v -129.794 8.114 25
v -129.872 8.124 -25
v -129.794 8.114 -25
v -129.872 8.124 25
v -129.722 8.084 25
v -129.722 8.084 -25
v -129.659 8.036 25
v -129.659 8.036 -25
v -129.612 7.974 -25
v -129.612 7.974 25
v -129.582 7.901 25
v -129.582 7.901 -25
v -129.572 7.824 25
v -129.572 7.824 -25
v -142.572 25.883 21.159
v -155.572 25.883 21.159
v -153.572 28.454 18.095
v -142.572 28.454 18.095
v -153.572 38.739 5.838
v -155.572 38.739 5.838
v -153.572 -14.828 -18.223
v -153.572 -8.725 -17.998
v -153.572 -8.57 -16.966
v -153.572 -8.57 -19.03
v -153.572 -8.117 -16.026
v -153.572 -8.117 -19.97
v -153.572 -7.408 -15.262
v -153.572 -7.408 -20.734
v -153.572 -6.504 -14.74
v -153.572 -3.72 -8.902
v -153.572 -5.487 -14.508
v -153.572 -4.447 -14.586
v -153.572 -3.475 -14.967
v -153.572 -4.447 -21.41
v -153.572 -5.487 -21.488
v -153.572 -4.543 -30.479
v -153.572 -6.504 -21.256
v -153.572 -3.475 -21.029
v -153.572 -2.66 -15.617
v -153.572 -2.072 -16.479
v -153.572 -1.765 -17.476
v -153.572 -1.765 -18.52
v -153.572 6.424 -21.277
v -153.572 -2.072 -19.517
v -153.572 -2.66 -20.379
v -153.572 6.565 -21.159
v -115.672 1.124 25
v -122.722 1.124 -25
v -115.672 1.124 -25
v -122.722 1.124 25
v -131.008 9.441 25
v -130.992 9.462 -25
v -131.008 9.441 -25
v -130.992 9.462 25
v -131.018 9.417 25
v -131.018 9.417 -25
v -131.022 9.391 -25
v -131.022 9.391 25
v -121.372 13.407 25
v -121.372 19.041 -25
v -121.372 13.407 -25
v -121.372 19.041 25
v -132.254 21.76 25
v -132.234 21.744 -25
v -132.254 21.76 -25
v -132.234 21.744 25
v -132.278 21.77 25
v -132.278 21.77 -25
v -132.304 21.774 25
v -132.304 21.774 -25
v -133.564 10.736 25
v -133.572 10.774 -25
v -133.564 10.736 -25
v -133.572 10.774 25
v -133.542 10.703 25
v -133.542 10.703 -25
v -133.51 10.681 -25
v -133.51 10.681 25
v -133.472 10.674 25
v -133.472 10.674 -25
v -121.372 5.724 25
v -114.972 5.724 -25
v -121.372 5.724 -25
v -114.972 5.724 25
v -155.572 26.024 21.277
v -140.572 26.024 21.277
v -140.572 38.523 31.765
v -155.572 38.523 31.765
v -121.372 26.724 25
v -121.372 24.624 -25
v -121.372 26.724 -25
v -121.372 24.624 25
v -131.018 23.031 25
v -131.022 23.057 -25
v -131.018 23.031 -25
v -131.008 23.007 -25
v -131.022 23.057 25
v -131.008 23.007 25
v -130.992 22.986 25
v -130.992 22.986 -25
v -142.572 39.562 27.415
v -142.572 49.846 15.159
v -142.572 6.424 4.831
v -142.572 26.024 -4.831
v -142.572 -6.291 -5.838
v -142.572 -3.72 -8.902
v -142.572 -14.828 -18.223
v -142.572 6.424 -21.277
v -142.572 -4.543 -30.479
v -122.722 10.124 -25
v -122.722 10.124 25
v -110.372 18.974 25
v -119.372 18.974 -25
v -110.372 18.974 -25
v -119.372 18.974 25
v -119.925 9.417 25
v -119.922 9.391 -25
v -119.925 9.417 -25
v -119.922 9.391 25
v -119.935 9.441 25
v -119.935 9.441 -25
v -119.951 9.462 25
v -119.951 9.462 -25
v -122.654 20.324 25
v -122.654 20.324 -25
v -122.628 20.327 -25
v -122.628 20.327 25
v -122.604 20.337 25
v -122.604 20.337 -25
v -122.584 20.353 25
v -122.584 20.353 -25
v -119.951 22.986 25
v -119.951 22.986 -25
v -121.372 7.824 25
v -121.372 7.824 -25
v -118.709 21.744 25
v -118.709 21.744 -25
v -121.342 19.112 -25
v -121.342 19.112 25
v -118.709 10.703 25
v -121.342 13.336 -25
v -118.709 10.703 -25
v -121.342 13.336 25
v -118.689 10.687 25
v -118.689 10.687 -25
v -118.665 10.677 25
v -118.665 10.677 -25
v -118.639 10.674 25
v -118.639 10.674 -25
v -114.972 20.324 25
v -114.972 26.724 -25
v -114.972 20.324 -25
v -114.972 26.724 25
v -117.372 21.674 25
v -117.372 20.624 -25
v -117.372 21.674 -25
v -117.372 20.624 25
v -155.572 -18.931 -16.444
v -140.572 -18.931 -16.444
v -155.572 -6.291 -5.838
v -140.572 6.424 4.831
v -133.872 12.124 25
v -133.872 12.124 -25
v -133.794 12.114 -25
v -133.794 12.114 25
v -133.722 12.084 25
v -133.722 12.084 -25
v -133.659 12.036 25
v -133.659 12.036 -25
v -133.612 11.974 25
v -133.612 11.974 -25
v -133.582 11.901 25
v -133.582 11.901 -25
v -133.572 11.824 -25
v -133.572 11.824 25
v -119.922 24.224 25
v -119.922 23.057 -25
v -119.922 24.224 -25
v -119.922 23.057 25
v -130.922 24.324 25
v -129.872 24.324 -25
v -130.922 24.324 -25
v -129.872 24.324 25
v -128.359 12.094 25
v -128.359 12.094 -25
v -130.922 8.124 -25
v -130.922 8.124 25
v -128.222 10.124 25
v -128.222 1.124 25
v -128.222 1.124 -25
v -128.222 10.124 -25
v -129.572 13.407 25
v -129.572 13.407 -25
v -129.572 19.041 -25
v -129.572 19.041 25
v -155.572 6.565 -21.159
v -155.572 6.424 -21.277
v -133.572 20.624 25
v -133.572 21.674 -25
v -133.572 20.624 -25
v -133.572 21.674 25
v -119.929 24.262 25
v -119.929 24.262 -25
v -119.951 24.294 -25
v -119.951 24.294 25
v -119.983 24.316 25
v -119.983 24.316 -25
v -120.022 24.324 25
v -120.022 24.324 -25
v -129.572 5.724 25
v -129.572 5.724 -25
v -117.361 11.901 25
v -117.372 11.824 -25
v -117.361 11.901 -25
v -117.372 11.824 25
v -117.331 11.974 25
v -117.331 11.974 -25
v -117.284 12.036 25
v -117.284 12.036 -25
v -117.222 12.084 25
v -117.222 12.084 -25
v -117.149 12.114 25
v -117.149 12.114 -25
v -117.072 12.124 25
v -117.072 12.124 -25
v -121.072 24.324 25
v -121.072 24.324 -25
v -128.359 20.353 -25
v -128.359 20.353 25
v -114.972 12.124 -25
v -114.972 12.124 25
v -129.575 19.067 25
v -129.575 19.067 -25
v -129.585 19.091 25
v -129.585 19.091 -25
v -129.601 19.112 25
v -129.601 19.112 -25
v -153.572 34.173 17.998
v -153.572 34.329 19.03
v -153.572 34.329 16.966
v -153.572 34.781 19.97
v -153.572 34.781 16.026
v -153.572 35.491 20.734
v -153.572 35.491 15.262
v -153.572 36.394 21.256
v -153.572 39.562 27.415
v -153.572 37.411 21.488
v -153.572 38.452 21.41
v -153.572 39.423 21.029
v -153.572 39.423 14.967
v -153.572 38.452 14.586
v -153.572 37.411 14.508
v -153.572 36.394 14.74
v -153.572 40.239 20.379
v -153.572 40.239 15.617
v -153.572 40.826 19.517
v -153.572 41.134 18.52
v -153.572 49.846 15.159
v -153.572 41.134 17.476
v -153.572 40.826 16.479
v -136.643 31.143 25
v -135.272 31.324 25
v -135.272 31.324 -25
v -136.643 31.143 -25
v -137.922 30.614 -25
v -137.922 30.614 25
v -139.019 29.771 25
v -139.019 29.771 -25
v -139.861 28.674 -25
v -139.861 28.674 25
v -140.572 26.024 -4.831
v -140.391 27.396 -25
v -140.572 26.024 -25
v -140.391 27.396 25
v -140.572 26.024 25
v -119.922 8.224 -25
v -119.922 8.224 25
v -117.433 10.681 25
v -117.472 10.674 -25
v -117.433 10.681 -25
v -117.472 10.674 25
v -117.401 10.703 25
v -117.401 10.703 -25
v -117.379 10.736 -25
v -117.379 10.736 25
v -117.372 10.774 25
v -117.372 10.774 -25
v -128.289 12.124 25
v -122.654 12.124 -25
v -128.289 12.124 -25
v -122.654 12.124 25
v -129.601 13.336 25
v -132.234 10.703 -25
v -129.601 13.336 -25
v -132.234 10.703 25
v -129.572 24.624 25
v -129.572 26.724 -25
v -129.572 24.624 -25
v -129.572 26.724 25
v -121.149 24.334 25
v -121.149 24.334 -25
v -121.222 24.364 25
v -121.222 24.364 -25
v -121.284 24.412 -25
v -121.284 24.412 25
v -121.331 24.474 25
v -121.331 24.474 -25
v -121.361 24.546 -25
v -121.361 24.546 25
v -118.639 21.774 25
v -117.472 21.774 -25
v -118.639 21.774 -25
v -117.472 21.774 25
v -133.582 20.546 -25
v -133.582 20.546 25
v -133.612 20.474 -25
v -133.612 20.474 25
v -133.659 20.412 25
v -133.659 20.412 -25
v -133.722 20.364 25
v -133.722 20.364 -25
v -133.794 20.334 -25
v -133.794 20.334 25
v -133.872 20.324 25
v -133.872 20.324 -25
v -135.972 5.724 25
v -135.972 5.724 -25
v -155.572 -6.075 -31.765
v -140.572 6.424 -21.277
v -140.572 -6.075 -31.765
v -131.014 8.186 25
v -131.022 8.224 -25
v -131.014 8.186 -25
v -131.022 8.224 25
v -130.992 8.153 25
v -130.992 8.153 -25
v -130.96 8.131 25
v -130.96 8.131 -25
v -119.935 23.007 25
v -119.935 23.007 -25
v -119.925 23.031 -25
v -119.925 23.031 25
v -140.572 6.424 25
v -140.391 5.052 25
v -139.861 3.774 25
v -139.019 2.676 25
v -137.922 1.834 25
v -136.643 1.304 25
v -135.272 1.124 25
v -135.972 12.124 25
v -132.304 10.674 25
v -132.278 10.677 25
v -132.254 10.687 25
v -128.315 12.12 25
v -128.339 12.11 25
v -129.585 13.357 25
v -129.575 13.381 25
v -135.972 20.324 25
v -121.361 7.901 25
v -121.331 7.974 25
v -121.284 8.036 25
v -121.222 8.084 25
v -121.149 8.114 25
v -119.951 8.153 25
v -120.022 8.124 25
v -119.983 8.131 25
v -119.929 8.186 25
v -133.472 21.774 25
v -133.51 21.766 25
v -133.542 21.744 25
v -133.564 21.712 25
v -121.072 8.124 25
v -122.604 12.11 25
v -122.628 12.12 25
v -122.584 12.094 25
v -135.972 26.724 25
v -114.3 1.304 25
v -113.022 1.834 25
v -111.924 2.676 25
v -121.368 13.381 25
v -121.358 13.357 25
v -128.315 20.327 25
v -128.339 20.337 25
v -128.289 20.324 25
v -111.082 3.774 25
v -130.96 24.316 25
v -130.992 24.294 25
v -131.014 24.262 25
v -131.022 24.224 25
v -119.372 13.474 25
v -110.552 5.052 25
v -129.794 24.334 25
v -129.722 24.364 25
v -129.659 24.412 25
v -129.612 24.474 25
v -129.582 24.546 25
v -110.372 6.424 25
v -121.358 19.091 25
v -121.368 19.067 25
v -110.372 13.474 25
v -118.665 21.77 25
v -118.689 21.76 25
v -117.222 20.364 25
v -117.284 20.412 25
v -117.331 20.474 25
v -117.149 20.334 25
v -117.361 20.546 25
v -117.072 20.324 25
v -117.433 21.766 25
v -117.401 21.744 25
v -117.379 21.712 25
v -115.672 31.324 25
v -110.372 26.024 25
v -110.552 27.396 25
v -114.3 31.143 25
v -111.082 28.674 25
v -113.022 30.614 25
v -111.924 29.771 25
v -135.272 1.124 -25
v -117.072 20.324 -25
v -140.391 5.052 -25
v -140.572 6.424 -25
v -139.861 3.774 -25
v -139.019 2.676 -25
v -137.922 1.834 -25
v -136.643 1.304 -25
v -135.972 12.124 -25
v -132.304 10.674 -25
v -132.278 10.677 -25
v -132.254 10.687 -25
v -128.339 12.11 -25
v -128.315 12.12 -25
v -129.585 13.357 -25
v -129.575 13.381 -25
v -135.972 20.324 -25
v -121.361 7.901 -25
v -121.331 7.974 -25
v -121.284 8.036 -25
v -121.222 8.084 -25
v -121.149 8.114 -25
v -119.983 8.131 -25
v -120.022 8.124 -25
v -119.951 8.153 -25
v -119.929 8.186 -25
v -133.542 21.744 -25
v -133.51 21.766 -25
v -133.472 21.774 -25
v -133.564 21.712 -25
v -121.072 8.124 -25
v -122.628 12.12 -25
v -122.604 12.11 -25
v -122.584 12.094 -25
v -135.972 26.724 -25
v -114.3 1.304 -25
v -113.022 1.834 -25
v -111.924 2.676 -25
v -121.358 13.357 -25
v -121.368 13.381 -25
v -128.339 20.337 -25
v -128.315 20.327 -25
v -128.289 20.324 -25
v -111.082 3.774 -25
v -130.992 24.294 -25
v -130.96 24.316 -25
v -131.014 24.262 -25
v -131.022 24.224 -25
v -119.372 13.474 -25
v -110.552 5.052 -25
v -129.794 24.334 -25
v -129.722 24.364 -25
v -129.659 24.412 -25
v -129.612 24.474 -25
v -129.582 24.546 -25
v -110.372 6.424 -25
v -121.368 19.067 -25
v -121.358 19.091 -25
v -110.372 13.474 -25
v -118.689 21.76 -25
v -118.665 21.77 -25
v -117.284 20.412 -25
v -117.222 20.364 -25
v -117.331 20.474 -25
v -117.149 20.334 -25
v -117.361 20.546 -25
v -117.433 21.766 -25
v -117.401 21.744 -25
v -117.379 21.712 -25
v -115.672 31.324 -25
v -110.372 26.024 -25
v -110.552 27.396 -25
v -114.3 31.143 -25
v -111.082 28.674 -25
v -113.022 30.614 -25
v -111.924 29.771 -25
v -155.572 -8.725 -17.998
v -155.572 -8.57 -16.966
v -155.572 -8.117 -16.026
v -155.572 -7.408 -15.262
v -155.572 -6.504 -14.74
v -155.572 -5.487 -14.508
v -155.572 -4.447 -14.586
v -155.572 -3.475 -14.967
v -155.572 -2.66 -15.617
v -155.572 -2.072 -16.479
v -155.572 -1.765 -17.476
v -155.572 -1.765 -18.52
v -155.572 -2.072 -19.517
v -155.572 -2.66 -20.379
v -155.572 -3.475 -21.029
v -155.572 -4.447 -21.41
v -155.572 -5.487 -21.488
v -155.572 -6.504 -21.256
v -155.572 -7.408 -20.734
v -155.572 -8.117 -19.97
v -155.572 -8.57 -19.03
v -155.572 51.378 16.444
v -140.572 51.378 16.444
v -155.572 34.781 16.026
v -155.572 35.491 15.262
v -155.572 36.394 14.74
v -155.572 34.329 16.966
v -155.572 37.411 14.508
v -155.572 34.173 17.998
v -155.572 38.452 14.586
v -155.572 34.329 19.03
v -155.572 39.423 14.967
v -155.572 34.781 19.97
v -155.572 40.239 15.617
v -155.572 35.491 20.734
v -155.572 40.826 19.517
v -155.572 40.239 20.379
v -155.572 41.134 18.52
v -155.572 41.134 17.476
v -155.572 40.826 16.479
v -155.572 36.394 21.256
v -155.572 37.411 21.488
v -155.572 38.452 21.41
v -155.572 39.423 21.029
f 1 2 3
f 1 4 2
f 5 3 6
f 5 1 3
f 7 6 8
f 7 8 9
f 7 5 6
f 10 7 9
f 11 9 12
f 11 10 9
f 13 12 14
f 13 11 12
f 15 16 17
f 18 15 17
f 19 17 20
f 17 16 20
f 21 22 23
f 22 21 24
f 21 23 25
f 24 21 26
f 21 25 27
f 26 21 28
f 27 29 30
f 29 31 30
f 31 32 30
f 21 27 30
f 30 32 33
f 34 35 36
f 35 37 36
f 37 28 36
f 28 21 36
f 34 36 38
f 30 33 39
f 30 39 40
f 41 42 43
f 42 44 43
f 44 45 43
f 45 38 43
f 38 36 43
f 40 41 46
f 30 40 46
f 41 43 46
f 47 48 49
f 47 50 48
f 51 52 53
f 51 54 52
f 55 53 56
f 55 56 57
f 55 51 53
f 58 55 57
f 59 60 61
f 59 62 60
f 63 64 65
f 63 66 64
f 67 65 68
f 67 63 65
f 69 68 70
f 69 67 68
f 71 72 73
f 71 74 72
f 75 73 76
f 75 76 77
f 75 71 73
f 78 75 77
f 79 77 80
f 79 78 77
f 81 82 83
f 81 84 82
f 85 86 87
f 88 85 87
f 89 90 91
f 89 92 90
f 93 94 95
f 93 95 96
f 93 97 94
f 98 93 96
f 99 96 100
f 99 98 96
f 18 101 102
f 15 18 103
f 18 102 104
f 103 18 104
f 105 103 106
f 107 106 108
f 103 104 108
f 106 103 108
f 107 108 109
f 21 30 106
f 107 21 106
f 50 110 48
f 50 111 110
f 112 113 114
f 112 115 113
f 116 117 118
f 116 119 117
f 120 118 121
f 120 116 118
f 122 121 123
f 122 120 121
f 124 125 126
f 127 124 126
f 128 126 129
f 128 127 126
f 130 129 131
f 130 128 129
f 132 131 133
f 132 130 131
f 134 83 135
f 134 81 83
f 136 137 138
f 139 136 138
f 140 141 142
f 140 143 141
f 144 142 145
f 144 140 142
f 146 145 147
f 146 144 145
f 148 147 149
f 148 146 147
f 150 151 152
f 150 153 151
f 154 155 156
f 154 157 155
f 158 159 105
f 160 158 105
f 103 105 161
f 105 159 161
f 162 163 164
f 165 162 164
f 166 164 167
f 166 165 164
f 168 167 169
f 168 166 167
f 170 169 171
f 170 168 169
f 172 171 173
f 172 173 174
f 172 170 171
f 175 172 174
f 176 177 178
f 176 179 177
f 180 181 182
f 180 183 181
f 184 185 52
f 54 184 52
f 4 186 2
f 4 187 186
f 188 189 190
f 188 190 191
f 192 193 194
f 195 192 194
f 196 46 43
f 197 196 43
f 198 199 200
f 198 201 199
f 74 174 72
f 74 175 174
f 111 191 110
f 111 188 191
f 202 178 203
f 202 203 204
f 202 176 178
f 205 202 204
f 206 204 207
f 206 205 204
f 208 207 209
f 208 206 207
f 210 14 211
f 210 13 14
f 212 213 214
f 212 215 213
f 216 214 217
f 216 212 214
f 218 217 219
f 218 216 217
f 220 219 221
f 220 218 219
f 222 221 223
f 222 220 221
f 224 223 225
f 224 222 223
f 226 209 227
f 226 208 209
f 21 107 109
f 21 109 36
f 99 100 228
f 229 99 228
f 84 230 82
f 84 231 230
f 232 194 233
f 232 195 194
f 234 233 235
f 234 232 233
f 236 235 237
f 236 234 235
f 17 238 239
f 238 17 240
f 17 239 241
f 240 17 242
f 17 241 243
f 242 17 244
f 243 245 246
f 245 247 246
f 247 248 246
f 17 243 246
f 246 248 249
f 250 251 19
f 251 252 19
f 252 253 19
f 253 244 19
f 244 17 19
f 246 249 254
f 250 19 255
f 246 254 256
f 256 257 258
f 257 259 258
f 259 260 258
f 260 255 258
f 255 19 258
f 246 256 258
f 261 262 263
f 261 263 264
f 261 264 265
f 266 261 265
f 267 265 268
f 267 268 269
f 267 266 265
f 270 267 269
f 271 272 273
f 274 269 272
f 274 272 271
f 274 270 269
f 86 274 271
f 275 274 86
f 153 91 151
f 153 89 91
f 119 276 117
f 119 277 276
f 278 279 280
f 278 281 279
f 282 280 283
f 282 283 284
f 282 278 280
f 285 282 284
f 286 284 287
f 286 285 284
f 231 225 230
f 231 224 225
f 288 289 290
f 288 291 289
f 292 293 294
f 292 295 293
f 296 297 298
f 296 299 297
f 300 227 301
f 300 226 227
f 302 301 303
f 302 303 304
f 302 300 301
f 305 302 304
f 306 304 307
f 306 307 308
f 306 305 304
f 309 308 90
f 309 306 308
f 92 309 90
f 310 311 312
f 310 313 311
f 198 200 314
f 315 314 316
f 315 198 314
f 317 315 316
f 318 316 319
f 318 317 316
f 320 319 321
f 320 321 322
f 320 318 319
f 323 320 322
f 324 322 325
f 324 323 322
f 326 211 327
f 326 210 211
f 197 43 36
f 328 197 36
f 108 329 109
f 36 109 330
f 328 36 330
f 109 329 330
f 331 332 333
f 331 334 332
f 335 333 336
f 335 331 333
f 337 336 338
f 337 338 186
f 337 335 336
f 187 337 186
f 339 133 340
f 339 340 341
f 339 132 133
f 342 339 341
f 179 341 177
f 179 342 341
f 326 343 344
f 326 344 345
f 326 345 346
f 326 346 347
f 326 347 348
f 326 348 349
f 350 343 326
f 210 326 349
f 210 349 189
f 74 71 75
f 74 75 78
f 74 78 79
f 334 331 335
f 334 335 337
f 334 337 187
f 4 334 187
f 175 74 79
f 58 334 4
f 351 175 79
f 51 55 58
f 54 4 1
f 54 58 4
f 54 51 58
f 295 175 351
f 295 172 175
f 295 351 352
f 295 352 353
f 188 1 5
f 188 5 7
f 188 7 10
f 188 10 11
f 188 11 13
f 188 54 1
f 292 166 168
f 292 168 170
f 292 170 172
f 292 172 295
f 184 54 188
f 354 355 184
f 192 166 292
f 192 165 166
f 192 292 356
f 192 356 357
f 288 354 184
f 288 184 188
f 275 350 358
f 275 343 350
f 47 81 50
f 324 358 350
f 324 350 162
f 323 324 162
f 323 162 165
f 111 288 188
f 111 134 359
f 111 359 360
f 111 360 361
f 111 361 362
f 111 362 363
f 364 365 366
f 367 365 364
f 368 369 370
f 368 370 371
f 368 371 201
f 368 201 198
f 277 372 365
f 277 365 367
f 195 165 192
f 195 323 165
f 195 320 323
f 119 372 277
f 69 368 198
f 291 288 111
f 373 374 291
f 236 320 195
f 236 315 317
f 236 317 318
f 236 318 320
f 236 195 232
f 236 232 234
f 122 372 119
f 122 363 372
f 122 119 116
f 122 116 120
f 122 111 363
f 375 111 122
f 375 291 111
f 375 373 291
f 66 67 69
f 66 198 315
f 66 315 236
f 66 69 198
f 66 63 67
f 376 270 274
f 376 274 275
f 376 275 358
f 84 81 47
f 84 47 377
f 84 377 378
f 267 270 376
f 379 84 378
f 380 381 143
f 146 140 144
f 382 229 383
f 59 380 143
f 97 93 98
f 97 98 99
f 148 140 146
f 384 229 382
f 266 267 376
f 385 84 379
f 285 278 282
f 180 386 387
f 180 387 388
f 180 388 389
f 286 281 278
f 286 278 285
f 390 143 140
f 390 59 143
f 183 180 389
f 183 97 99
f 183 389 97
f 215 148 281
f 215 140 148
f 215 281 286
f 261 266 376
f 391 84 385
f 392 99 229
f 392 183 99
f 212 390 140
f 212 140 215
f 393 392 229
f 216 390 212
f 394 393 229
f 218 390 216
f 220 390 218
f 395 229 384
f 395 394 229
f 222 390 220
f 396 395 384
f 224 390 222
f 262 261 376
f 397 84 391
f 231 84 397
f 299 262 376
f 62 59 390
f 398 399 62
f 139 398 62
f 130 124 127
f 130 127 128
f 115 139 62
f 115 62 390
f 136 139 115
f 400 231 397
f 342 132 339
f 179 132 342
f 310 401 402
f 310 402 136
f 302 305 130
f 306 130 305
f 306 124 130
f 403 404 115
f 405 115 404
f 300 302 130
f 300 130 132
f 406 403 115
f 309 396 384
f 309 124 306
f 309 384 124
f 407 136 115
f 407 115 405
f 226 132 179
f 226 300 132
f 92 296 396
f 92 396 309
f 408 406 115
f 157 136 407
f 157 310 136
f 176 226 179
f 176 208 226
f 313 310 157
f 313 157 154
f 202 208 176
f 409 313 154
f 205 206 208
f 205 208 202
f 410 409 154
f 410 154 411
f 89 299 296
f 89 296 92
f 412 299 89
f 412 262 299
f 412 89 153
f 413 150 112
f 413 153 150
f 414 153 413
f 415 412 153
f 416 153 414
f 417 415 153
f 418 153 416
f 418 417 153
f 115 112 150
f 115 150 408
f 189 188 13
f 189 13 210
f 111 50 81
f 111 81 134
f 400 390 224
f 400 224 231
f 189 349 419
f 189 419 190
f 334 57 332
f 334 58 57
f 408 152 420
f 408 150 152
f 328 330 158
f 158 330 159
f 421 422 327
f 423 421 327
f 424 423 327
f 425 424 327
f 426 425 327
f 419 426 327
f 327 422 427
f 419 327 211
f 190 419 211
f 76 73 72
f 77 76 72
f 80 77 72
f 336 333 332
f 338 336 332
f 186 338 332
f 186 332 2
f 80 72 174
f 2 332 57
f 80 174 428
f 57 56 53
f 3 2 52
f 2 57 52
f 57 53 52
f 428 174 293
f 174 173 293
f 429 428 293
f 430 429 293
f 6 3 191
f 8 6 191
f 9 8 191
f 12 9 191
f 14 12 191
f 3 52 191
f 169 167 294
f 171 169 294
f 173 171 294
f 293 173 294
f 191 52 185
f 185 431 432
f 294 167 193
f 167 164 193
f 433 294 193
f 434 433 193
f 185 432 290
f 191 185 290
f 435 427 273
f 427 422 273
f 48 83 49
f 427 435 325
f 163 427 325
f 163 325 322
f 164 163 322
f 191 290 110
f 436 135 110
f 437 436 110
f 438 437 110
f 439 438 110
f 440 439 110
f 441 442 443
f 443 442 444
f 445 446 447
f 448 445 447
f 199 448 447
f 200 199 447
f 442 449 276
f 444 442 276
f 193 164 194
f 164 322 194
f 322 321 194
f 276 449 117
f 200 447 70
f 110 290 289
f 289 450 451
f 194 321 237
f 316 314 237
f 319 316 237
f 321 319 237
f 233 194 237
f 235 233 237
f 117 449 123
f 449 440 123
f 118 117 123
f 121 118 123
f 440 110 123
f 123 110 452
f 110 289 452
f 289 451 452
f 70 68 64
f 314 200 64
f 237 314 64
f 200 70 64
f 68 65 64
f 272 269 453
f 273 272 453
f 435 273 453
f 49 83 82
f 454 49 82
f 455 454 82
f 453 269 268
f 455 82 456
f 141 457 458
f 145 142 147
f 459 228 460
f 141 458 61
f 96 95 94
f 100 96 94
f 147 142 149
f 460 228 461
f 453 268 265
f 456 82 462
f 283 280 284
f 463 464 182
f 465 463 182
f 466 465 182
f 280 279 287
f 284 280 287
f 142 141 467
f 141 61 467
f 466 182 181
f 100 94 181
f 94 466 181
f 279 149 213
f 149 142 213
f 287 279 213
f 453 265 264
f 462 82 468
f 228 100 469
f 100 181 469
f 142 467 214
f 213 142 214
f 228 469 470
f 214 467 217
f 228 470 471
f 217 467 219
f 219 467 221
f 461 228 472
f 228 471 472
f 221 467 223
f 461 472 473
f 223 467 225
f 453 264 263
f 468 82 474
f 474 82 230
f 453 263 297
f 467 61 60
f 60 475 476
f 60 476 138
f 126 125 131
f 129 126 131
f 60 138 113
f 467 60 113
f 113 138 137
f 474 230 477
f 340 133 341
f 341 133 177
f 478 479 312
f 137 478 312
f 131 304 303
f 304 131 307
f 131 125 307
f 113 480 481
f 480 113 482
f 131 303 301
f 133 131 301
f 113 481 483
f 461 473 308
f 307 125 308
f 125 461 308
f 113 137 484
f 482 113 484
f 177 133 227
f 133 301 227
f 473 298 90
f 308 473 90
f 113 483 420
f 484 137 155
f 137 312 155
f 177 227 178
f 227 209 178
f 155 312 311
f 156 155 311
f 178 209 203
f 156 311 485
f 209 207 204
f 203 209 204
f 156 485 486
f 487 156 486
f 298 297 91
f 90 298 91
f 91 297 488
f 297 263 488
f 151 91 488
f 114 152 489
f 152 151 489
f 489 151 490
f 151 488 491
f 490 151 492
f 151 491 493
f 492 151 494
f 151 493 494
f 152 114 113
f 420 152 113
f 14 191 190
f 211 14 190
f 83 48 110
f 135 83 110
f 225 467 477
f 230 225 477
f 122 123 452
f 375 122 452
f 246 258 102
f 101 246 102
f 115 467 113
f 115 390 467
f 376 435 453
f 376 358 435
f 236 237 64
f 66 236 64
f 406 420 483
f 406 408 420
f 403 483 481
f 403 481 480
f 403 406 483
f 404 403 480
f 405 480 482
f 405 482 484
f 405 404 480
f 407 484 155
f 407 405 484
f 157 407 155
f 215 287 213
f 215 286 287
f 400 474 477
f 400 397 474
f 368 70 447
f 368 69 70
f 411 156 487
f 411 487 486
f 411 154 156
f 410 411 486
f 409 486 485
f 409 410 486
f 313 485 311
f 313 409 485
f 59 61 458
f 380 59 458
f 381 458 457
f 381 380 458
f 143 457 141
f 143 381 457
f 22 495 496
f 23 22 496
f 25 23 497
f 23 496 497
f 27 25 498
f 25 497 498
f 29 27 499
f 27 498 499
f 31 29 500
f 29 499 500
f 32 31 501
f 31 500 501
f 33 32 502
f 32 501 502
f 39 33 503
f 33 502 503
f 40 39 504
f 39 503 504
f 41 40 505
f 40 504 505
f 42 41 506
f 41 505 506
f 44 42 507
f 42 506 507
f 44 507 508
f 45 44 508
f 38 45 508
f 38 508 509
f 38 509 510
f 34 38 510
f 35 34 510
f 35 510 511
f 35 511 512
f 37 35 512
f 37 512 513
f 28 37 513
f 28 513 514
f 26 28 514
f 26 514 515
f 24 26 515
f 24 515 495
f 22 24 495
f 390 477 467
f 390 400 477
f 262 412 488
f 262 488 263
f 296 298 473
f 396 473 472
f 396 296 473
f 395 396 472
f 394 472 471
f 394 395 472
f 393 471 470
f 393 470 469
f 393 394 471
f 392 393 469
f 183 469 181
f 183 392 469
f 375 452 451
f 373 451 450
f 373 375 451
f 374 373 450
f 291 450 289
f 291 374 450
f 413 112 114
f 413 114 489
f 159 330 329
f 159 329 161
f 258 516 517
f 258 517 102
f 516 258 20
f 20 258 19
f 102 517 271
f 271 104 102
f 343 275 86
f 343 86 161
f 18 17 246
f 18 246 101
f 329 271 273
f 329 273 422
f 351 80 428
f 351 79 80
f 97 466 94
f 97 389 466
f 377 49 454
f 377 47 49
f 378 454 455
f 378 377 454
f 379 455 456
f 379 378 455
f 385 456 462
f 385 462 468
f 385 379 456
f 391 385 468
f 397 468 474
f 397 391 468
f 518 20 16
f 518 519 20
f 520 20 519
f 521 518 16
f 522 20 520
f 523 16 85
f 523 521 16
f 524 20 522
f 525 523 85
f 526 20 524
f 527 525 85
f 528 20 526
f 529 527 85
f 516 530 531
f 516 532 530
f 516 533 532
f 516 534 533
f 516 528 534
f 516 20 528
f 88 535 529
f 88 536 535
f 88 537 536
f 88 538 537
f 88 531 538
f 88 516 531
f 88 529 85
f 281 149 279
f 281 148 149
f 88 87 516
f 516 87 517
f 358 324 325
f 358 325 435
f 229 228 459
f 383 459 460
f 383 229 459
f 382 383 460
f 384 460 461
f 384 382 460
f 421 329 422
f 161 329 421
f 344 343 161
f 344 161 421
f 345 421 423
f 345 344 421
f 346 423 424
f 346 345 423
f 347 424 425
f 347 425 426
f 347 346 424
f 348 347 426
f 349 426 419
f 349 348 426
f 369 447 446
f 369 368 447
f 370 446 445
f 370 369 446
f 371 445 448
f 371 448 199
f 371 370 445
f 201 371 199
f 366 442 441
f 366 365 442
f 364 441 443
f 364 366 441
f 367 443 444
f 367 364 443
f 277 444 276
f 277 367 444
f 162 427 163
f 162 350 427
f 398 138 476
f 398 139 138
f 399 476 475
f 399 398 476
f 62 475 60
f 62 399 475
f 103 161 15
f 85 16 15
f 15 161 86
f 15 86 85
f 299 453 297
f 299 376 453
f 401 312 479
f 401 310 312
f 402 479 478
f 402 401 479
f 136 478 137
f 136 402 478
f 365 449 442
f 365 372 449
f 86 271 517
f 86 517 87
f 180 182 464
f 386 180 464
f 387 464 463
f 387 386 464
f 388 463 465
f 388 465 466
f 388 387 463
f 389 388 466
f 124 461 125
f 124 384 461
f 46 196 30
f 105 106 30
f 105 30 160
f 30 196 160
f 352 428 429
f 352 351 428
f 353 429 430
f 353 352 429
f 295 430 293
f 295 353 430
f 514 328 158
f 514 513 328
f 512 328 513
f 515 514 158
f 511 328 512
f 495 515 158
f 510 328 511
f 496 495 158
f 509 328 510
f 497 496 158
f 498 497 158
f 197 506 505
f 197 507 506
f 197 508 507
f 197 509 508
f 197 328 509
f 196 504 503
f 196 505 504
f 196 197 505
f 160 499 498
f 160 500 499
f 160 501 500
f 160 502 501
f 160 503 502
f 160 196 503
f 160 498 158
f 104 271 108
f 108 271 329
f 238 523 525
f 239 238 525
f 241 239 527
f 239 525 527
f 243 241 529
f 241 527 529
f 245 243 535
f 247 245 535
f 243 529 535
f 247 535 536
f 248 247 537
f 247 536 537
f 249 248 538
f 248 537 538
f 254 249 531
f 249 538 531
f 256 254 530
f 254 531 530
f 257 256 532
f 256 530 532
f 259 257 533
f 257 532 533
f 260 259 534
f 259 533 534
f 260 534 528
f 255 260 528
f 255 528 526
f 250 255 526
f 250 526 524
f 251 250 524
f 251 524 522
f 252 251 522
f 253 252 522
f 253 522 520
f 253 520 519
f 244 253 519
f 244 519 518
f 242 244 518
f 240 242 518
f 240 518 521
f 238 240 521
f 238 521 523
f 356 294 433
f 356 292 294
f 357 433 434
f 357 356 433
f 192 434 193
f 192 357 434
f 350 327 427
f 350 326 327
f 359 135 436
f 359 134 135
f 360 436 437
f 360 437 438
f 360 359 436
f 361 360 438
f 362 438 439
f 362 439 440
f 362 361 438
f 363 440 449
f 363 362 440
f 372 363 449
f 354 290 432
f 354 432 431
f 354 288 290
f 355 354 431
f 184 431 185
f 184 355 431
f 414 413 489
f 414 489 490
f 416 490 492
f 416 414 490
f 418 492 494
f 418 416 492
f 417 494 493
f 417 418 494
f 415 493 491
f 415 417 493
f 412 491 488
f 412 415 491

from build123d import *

# Parameters (mm, degrees)
Y_KSEKLIK_EKSTR_ZYON3_DEPTH = 25
Y_KSEKLIK_EKSTR_ZYON4_DEPTH = 15
IZIM11_R                    = 3.5
KES_EKSTR_ZYON3_DEPTH       = 10
KES_EKSTR_ZYON4_DEPTH       = 16
KES_EKSTR_ZYON5_REACH       = 77.444


with BuildPart() as part:
    # Çizim6 → Yükseklik-Ekstrüzyon3 (new, symmetric)
    with BuildSketch(Plane.XY):
        with BuildLine():
            Line((-119.371512251, 18.973770729), (-115.371512251, 18.973770729))
            Line((-115.371512251, 18.973770729), (-110.371512251, 18.973770729))
            Line((-110.371512251, 18.973770729), (-110.371512251, 20.773770729))
            Line((-110.371512251, 20.773770729), (-110.371512251, 26.023770729))
            ThreePointArc((-110.371512251, 26.023770729), (-111.92384631, 29.771436669), (-115.671512251, 31.323770729))
            Line((-115.671512251, 31.323770729), (-120.921512251, 31.323770729))
            Line((-120.921512251, 31.323770729), (-122.721512251, 31.323770729))
            Line((-122.721512251, 31.323770729), (-128.221512251, 31.323770729))
            Line((-128.221512251, 31.323770729), (-130.021512251, 31.323770729))
            Line((-130.021512251, 31.323770729), (-135.271512251, 31.323770729))
            ThreePointArc((-135.271512251, 31.323770729), (-139.019178191, 29.771436669), (-140.571512251, 26.023770729))
            Line((-140.571512251, 26.023770729), (-140.571512251, 20.773770729))
            Line((-140.571512251, 20.773770729), (-140.571512251, 16.223770729))
            Line((-140.571512251, 16.223770729), (-140.571512251, 11.673770729))
            Line((-140.571512251, 11.673770729), (-140.571512251, 6.423770729))
            ThreePointArc((-140.571512251, 6.423770729), (-139.019178191, 2.676104789), (-135.271512251, 1.123770729))
            Line((-135.271512251, 1.123770729), (-130.021512251, 1.123770729))
            Line((-130.021512251, 1.123770729), (-128.221512251, 1.123770729))
            Line((-128.221512251, 1.123770729), (-128.221512251, 6.123770729))
            Line((-128.221512251, 6.123770729), (-128.221512251, 10.123770729))
            Line((-128.221512251, 10.123770729), (-122.721512251, 10.123770729))
            Line((-122.721512251, 10.123770729), (-122.721512251, 6.123770729))
            Line((-122.721512251, 6.123770729), (-122.721512251, 1.123770729))
            Line((-122.721512251, 1.123770729), (-120.921512251, 1.123770729))
            Line((-120.921512251, 1.123770729), (-115.671512251, 1.123770729))
            ThreePointArc((-115.671512251, 1.123770729), (-111.92384631, 2.676104789), (-110.371512251, 6.423770729))
            Line((-110.371512251, 6.423770729), (-110.371512251, 11.673770729))
            Line((-110.371512251, 11.673770729), (-110.371512251, 13.473770729))
            Line((-110.371512251, 13.473770729), (-115.371512251, 13.473770729))
            Line((-115.371512251, 13.473770729), (-119.371512251, 13.473770729))
            Line((-119.371512251, 13.473770729), (-119.371512251, 18.973770729))
        make_face()
        with BuildLine():
            Line((-133.871512251, 20.323770729), (-135.071512251, 20.323770729))
            Line((-135.071512251, 20.323770729), (-135.871512251, 20.323770729))
            Line((-135.871512251, 20.323770729), (-135.971512251, 20.323770729))
            Line((-135.971512251, 20.323770729), (-135.971512251, 26.723770729))
            Line((-135.971512251, 26.723770729), (-129.571512251, 26.723770729))
            Line((-129.571512251, 26.723770729), (-129.571512251, 26.623770729))
            Line((-129.571512251, 26.623770729), (-129.571512251, 25.823770729))
            Line((-129.571512251, 25.823770729), (-129.571512251, 24.623770729))
            ThreePointArc((-129.571512251, 24.623770729), (-129.659380216, 24.411638694), (-129.871512251, 24.323770729))
            Line((-129.871512251, 24.323770729), (-130.921512251, 24.323770729))
            ThreePointArc((-130.921512251, 24.323770729), (-130.992222929, 24.294481407), (-131.021512251, 24.223770729))
            Line((-131.021512251, 24.223770729), (-131.021512251, 23.056613441))
            ThreePointArc((-131.021512251, 23.056613441), (-131.013900204, 23.018345098), (-130.992222929, 22.985902763))
            Line((-130.992222929, 22.985902763), (-128.359380216, 20.353060051))
            ThreePointArc((-128.359380216, 20.353060051), (-128.326937882, 20.331382776), (-128.288669538, 20.323770729))
            Line((-128.288669538, 20.323770729), (-122.654354963, 20.323770729))
            ThreePointArc((-122.654354963, 20.323770729), (-122.61608662, 20.331382776), (-122.583644285, 20.353060051))
            Line((-122.583644285, 20.353060051), (-119.950801573, 22.985902763))
            ThreePointArc((-119.950801573, 22.985902763), (-119.929124298, 23.018345098), (-119.921512251, 23.056613441))
            Line((-119.921512251, 23.056613441), (-119.921512251, 24.223770729))
            ThreePointArc((-119.921512251, 24.223770729), (-119.950801573, 24.294481407), (-120.021512251, 24.323770729))
            Line((-120.021512251, 24.323770729), (-121.071512251, 24.323770729))
            ThreePointArc((-121.071512251, 24.323770729), (-121.283644285, 24.411638694), (-121.371512251, 24.623770729))
            Line((-121.371512251, 24.623770729), (-121.371512251, 25.823770729))
            Line((-121.371512251, 25.823770729), (-121.371512251, 26.323770729))
            Line((-121.371512251, 26.323770729), (-121.371512251, 26.723770729))
            Line((-121.371512251, 26.723770729), (-114.971512251, 26.723770729))
            Line((-114.971512251, 26.723770729), (-114.971512251, 20.323770729))
            Line((-114.971512251, 20.323770729), (-115.371512251, 20.323770729))
            Line((-115.371512251, 20.323770729), (-115.871512251, 20.323770729))
            Line((-115.871512251, 20.323770729), (-117.071512251, 20.323770729))
            ThreePointArc((-117.071512251, 20.323770729), (-117.283644285, 20.411638694), (-117.371512251, 20.623770729))
            Line((-117.371512251, 20.623770729), (-117.371512251, 21.673770729))
            ThreePointArc((-117.371512251, 21.673770729), (-117.400801573, 21.744481407), (-117.471512251, 21.773770729))
            Line((-117.471512251, 21.773770729), (-118.638669538, 21.773770729))
            ThreePointArc((-118.638669538, 21.773770729), (-118.676937882, 21.766158682), (-118.709380216, 21.744481407))
            Line((-118.709380216, 21.744481407), (-121.342222929, 19.111638694))
            ThreePointArc((-121.342222929, 19.111638694), (-121.363900204, 19.07919636), (-121.371512251, 19.040928016))
            Line((-121.371512251, 19.040928016), (-121.371512251, 13.406613441))
            ThreePointArc((-121.371512251, 13.406613441), (-121.363900204, 13.368345098), (-121.342222929, 13.335902763))
            Line((-121.342222929, 13.335902763), (-118.709380216, 10.703060051))
            ThreePointArc((-118.709380216, 10.703060051), (-118.676937882, 10.681382776), (-118.638669538, 10.673770729))
            Line((-118.638669538, 10.673770729), (-117.471512251, 10.673770729))
            ThreePointArc((-117.471512251, 10.673770729), (-117.400801573, 10.703060051), (-117.371512251, 10.773770729))
            Line((-117.371512251, 10.773770729), (-117.371512251, 11.823770729))
            ThreePointArc((-117.371512251, 11.823770729), (-117.283644285, 12.035902763), (-117.071512251, 12.123770729))
            Line((-117.071512251, 12.123770729), (-115.871512251, 12.123770729))
            Line((-115.871512251, 12.123770729), (-115.371512251, 12.123770729))
            Line((-115.371512251, 12.123770729), (-114.971512251, 12.123770729))
            Line((-114.971512251, 12.123770729), (-114.971512251, 5.723770729))
            Line((-114.971512251, 5.723770729), (-121.371512251, 5.723770729))
            Line((-121.371512251, 5.723770729), (-121.371512251, 6.123770729))
            Line((-121.371512251, 6.123770729), (-121.371512251, 6.623770729))
            Line((-121.371512251, 6.623770729), (-121.371512251, 7.823770729))
            ThreePointArc((-121.371512251, 7.823770729), (-121.283644285, 8.035902763), (-121.071512251, 8.123770729))
            Line((-121.071512251, 8.123770729), (-120.021512251, 8.123770729))
            ThreePointArc((-120.021512251, 8.123770729), (-119.950801573, 8.153060051), (-119.921512251, 8.223770729))
            Line((-119.921512251, 8.223770729), (-119.921512251, 9.390928016))
            ThreePointArc((-119.921512251, 9.390928016), (-119.929124298, 9.42919636), (-119.950801573, 9.461638694))
            Line((-119.950801573, 9.461638694), (-122.583644285, 12.094481407))
            ThreePointArc((-122.583644285, 12.094481407), (-122.61608662, 12.116158682), (-122.654354963, 12.123770729))
            Line((-122.654354963, 12.123770729), (-128.288669538, 12.123770729))
            ThreePointArc((-128.288669538, 12.123770729), (-128.326937882, 12.116158682), (-128.359380216, 12.094481407))
            Line((-128.359380216, 12.094481407), (-130.992222929, 9.461638694))
            ThreePointArc((-130.992222929, 9.461638694), (-131.013900204, 9.42919636), (-131.021512251, 9.390928016))
            Line((-131.021512251, 9.390928016), (-131.021512251, 8.223770729))
            ThreePointArc((-131.021512251, 8.223770729), (-130.992222929, 8.153060051), (-130.921512251, 8.123770729))
            Line((-130.921512251, 8.123770729), (-129.871512251, 8.123770729))
            ThreePointArc((-129.871512251, 8.123770729), (-129.659380216, 8.035902763), (-129.571512251, 7.823770729))
            Line((-129.571512251, 7.823770729), (-129.571512251, 6.623770729))
            Line((-129.571512251, 6.623770729), (-129.571512251, 6.123770729))
            Line((-129.571512251, 6.123770729), (-129.571512251, 5.723770729))
            Line((-129.571512251, 5.723770729), (-135.971512251, 5.723770729))
            Line((-135.971512251, 5.723770729), (-135.971512251, 12.123770729))
            Line((-135.971512251, 12.123770729), (-135.571512251, 12.123770729))
            Line((-135.571512251, 12.123770729), (-135.071512251, 12.123770729))
            Line((-135.071512251, 12.123770729), (-133.871512251, 12.123770729))
            ThreePointArc((-133.871512251, 12.123770729), (-133.659380216, 12.035902763), (-133.571512251, 11.823770729))
            Line((-133.571512251, 11.823770729), (-133.571512251, 10.773770729))
            ThreePointArc((-133.571512251, 10.773770729), (-133.542222929, 10.703060051), (-133.471512251, 10.673770729))
            Line((-133.471512251, 10.673770729), (-132.304354963, 10.673770729))
            ThreePointArc((-132.304354963, 10.673770729), (-132.26608662, 10.681382776), (-132.233644285, 10.703060051))
            Line((-132.233644285, 10.703060051), (-129.600801573, 13.335902763))
            ThreePointArc((-129.600801573, 13.335902763), (-129.579124298, 13.368345098), (-129.571512251, 13.406613441))
            Line((-129.571512251, 13.406613441), (-129.571512251, 19.040928016))
            ThreePointArc((-129.571512251, 19.040928016), (-129.579124298, 19.07919636), (-129.600801573, 19.111638694))
            Line((-129.600801573, 19.111638694), (-132.233644285, 21.744481407))
            ThreePointArc((-132.233644285, 21.744481407), (-132.26608662, 21.766158682), (-132.304354963, 21.773770729))
            Line((-132.304354963, 21.773770729), (-133.471512251, 21.773770729))
            ThreePointArc((-133.471512251, 21.773770729), (-133.542222929, 21.744481407), (-133.571512251, 21.673770729))
            Line((-133.571512251, 21.673770729), (-133.571512251, 20.623770729))
            ThreePointArc((-133.571512251, 20.623770729), (-133.659380216, 20.411638694), (-133.871512251, 20.323770729))
        make_face(mode=Mode.SUBTRACT)
    extrude(amount=Y_KSEKLIK_EKSTR_ZYON3_DEPTH, both=True)

    # Çizim8 → Yükseklik-Ekstrüzyon4 (add)
    with BuildSketch(Plane.ZY.offset(140.571512251)):
        Polygon((4.830896508, 6.423770729), (-21.277249279, 6.423770729), (-31.764979794, -6.075019791), (-16.444090932, -18.930771985), align=None)
        Polygon((21.277249279, 26.023770729), (-4.830896508, 26.023770729), (-21.277249279, 6.423770729), (4.830896508, 6.423770729), align=None)
        Polygon((31.764979794, 38.522561249), (16.444090932, 51.378313443), (-4.830896508, 26.023770729), (21.277249279, 26.023770729), align=None)
    extrude(amount=Y_KSEKLIK_EKSTR_ZYON4_DEPTH)

    # Çizim11 → Kes-Ekstrüzyon3 (cut)
    with BuildSketch(Plane.ZY.offset(155.571512251)):
        with Locations(Location((17.998053071, 37.673015136, 0), (0, 0, 270))):
            Circle(IZIM11_R)
        with Locations(Location((-17.998053071, -5.225473678, 0), (0, 0, 270))):
            Circle(IZIM11_R)
    extrude(amount=-KES_EKSTR_ZYON3_DEPTH, mode=Mode.SUBTRACT)

    # Çizim12 → Kes-Ekstrüzyon4 (cut)
    with BuildSketch(Plane(origin=(0, 13.13114735, -15.64909203), x_dir=(1, 0, 0), z_dir=(-3.3982743057988596e-15, 0.6427876096865348, -0.7660444431189819))):
        Polygon((-142.571512251, 23.071870587), (-153.571512251, 23.071870587), (-153.571512251, -47.928129413), (-142.571512251, -47.928129413), (-142.571512251, -16.830124537), (-142.571512251, 8.755858334), align=None)
    extrude(amount=-KES_EKSTR_ZYON4_DEPTH, mode=Mode.SUBTRACT)

    # Kes-Ekstrüzyon5: up to this face of the body (flat: up to its plane)
    kes_ekstr_zyon5_end = Plane(part.part.faces().sort_by_distance((-142.571512251, 17.509345948, -1.532088886))[0])
    # Çizim13 → Kes-Ekstrüzyon5 (cut, up to the picked face)
    with BuildSketch(Plane.ZY.offset(155.571512251), mode=Mode.PRIVATE) as kes_ekstr_zyon5_sk1:
        Polygon((-21.158984235, 6.56471352), (-5.838095372, -6.291038674), (21.158984235, 25.882827937), (5.838095372, 38.738580131), align=None)
    kes_ekstr_zyon5_tool1 = split(extrude(kes_ekstr_zyon5_sk1.sketch, amount=-KES_EKSTR_ZYON5_REACH, mode=Mode.PRIVATE), bisect_by=kes_ekstr_zyon5_end, keep=Keep.BOTH, mode=Mode.PRIVATE)
    add(kes_ekstr_zyon5_tool1.solids().sort_by(Axis((-155.571512, 16.223771, 0), (1, 0, 0)))[0], mode=Mode.SUBTRACT)


solid = part.part
